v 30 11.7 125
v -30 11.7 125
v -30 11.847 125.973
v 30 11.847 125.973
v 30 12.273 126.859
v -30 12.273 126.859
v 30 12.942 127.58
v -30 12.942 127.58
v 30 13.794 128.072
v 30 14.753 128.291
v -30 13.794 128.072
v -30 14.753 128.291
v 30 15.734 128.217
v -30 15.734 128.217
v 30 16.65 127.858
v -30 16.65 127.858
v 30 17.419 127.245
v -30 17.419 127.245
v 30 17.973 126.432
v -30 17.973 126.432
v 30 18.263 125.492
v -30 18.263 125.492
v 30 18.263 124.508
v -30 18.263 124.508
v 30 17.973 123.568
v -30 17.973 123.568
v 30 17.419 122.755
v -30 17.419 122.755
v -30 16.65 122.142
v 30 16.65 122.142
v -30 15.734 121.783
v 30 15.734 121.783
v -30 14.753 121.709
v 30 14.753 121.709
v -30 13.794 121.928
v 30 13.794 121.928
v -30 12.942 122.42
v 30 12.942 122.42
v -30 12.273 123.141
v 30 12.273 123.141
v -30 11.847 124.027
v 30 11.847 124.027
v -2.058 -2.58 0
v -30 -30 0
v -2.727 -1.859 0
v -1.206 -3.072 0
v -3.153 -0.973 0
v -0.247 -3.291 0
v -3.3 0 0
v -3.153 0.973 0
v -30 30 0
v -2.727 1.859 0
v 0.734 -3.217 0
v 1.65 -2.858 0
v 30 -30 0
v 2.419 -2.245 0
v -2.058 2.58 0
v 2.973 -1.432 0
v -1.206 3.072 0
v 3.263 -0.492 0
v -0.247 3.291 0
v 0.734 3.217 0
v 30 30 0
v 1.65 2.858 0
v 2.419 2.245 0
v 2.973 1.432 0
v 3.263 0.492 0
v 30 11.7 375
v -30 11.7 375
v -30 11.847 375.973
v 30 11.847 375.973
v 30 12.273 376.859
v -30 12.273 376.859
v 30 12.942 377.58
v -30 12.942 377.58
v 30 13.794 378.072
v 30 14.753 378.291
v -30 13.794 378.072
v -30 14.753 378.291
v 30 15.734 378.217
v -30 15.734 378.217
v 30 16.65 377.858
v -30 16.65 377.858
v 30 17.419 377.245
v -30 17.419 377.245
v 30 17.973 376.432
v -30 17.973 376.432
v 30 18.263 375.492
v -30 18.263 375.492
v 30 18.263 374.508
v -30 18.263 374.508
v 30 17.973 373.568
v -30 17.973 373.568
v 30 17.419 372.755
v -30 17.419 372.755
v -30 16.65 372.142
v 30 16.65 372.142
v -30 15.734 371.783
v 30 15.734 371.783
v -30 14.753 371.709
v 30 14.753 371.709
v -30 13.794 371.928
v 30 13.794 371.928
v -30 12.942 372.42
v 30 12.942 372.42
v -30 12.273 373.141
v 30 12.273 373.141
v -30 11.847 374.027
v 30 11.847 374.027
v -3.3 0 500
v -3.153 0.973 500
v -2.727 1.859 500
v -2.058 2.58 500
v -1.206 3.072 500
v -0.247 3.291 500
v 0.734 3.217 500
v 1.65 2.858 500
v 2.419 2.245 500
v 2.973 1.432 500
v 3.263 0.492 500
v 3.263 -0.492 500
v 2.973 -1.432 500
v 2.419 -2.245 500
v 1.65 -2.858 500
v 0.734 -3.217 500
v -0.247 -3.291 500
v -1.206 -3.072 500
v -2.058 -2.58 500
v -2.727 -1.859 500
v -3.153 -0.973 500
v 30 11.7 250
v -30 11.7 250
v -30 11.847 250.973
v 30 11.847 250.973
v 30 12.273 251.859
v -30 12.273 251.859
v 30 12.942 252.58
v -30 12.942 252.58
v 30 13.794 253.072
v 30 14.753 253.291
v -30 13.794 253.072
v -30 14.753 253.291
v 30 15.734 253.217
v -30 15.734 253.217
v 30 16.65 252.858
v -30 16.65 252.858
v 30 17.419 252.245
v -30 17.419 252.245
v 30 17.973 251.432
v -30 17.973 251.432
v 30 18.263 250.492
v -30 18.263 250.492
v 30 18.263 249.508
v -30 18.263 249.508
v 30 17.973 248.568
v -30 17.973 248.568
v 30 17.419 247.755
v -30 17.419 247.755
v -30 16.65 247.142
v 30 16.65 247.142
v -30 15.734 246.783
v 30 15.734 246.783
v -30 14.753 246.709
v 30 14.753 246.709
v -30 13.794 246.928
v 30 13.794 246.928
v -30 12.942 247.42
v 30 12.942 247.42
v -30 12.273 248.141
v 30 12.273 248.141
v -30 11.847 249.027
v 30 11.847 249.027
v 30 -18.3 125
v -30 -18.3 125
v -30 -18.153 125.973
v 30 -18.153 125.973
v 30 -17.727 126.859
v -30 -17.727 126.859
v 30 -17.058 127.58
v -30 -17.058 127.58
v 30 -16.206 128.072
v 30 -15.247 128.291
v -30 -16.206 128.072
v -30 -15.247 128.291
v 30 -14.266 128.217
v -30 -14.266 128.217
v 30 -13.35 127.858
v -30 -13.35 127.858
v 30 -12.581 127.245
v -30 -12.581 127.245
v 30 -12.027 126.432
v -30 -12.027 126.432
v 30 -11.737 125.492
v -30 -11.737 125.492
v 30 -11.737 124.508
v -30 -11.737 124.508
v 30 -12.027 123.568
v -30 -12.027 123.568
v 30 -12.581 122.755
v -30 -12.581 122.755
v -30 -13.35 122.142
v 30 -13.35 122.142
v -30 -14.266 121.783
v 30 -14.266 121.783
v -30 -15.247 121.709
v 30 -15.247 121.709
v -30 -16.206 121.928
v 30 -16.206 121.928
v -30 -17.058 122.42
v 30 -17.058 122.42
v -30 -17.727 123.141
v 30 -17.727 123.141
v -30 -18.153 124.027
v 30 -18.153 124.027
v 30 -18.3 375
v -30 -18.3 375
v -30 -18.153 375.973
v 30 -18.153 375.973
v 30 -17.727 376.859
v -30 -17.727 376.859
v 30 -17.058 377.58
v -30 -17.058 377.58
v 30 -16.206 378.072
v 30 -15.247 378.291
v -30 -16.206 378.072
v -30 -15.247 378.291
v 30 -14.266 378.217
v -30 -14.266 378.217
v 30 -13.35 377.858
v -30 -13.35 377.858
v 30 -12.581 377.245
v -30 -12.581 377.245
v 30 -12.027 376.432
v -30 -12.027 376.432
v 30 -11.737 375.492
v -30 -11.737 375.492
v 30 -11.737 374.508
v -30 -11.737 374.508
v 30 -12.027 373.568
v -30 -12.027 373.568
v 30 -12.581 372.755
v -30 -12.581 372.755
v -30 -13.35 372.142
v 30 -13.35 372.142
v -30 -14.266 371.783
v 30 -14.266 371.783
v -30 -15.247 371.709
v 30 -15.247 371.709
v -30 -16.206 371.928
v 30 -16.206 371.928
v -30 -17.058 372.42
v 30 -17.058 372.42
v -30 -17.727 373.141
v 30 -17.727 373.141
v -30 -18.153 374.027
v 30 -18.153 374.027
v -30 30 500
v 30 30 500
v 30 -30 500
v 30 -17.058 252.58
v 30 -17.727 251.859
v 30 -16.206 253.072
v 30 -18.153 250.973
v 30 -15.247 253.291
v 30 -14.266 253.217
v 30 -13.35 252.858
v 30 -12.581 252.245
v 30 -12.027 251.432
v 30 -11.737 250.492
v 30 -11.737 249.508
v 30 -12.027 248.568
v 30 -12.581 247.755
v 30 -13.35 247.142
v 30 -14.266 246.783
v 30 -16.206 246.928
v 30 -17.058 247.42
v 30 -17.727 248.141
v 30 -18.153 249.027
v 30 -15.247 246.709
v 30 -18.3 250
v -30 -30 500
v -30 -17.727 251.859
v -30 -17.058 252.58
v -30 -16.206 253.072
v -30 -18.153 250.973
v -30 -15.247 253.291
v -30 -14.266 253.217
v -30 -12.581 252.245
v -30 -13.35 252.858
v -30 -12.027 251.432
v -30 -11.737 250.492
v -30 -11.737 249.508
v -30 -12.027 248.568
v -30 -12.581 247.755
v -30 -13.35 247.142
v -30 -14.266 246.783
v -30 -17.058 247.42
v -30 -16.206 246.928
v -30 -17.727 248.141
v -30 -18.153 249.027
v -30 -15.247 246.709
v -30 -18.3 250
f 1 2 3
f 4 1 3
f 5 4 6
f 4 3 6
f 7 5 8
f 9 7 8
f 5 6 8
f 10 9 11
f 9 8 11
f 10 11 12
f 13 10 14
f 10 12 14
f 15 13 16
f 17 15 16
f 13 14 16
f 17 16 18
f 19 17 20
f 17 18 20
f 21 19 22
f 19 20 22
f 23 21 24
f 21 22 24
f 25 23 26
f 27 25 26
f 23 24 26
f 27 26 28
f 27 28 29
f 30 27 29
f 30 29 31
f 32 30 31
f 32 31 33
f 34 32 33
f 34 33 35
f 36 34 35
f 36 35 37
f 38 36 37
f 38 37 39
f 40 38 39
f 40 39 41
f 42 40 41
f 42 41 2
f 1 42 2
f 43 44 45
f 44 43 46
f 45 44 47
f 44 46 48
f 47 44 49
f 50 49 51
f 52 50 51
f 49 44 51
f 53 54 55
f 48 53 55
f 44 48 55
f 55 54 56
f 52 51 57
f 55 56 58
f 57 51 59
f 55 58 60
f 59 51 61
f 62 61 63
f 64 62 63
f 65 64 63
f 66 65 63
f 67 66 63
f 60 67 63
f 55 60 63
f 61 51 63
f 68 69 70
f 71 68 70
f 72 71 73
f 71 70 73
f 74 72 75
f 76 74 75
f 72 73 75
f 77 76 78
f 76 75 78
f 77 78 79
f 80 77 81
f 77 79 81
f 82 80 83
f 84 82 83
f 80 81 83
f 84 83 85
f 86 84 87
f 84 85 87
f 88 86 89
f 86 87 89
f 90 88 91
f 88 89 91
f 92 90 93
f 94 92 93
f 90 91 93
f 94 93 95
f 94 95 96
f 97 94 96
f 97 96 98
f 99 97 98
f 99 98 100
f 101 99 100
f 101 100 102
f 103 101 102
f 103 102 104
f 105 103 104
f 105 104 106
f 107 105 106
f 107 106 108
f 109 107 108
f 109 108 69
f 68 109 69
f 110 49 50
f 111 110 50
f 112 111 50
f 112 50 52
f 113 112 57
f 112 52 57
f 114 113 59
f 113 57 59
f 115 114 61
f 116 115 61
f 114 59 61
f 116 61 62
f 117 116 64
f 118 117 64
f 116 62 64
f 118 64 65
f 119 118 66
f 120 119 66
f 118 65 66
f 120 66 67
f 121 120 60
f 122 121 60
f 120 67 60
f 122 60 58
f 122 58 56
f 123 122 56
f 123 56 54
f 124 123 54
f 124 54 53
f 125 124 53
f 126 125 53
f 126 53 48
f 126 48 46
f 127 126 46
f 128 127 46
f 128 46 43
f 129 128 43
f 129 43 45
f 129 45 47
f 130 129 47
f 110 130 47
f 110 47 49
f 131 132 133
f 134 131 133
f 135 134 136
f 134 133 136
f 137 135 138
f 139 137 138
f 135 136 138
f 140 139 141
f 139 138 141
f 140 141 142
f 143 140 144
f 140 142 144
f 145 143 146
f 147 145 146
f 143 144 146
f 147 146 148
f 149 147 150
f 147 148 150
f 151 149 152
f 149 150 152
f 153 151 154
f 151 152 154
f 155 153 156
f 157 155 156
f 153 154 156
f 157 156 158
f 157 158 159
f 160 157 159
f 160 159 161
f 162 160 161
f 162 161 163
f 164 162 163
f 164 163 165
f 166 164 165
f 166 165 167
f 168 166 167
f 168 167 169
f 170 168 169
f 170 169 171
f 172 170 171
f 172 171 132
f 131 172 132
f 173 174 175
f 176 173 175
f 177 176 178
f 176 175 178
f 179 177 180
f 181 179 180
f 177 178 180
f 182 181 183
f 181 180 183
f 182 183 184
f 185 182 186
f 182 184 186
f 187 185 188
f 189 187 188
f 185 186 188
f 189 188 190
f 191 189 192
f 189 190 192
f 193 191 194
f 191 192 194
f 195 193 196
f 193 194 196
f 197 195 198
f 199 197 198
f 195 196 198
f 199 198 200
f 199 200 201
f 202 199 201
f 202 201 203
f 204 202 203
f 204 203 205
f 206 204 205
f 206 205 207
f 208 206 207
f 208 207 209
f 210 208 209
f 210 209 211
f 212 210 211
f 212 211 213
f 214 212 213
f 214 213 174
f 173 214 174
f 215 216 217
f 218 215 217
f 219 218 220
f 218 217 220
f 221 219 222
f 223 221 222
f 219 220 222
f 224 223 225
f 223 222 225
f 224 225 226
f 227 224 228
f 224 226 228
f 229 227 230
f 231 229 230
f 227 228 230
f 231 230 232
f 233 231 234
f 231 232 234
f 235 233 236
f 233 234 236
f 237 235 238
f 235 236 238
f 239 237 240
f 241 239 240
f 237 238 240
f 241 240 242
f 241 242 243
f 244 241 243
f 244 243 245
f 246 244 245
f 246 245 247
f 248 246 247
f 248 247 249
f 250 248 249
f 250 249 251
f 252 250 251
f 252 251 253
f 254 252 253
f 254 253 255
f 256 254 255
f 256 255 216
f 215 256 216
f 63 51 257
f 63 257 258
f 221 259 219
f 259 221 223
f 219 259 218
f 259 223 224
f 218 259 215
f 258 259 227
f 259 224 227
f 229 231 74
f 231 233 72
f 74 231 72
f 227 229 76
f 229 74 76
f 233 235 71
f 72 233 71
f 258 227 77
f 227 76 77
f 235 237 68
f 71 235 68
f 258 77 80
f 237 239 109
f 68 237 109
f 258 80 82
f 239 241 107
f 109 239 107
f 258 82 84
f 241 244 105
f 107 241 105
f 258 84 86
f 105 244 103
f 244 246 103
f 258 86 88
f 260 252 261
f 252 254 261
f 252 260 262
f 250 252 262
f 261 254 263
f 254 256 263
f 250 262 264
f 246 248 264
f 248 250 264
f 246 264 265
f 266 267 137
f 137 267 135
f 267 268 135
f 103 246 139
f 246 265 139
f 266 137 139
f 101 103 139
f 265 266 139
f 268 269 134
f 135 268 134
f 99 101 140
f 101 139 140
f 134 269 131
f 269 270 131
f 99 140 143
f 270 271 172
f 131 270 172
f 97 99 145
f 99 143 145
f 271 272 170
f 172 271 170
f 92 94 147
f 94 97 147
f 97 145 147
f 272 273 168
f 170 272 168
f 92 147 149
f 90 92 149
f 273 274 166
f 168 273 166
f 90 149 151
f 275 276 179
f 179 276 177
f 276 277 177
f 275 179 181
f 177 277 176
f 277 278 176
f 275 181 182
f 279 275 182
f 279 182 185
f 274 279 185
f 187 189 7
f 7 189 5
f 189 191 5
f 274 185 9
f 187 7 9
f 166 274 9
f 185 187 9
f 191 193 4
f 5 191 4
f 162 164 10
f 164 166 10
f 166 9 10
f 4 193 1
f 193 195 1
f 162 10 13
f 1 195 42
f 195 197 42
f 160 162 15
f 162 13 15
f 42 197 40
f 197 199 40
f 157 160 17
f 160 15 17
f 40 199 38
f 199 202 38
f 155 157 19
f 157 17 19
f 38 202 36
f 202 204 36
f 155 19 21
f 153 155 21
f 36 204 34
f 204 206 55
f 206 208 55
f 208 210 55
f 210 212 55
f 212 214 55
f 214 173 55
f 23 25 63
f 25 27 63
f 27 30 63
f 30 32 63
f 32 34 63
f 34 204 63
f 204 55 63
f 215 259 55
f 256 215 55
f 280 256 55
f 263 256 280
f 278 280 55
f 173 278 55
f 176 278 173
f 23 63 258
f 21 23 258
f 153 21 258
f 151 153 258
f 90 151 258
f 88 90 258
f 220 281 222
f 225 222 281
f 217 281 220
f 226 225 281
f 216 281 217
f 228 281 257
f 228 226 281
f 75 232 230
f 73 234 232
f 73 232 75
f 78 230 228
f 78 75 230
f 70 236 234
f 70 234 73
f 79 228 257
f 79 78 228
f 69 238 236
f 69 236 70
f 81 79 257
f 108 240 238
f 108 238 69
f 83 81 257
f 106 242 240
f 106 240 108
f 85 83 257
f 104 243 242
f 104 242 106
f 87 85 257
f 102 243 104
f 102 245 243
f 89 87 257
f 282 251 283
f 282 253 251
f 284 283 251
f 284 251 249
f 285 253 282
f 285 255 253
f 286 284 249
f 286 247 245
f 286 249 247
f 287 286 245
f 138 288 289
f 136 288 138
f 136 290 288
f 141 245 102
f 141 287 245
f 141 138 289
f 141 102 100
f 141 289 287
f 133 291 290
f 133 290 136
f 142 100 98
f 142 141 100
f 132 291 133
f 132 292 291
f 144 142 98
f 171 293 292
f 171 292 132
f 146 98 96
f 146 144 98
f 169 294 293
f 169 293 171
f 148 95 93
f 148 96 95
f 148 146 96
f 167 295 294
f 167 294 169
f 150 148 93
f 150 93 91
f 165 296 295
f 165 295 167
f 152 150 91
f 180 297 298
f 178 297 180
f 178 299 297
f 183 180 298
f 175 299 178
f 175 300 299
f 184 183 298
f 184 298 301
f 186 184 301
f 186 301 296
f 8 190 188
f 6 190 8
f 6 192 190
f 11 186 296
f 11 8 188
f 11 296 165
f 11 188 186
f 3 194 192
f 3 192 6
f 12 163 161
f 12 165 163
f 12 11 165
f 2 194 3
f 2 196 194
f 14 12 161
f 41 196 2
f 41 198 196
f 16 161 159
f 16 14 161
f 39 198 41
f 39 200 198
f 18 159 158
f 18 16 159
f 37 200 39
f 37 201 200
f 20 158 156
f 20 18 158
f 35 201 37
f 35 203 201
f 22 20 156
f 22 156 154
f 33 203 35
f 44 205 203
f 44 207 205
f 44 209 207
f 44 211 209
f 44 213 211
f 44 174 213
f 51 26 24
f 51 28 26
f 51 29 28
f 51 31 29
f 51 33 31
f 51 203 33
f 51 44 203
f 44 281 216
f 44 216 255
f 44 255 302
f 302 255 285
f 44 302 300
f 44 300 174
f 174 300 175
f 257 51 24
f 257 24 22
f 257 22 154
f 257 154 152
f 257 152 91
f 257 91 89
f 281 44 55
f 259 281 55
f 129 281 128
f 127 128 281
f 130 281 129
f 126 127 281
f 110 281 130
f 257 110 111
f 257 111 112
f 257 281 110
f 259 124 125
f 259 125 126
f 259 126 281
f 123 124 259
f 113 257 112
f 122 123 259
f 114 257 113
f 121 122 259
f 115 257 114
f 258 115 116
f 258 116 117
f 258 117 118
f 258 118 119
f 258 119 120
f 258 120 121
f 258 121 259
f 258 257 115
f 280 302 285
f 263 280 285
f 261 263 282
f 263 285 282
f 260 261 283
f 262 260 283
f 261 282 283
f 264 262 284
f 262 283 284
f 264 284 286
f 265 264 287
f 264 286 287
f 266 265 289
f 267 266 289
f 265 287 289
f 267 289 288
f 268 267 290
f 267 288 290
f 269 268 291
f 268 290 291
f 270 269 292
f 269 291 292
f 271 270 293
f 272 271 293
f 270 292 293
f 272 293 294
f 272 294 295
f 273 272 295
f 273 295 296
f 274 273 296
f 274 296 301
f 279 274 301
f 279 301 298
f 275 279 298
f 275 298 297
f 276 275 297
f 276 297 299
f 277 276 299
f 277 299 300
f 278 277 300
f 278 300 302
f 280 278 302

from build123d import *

# Parameters (mm, degrees)
F0_W     = 60
F0_H     = 60
F1_DEPTH = 500
F3_D     = 6.6
F5_D     = 6.6


with BuildPart() as f1:
    # F0 (on Top) → F1 (new body)
    with BuildSketch(Plane.XY):
        Rectangle(F0_W, F0_H)
    extrude(amount=F1_DEPTH)

    # F3 (through all)
    with Locations(Plane.XY.offset(500)):
        with Locations((0, 0)):
            Hole(F3_D / 2)

    # F5 (through all)
    with Locations(Plane.YZ.offset(30)):
        with Locations((-15, 375), (15, 375), (15, 250), (15, 125), (-15, 125), (-15, 250)):
            Hole(F5_D / 2)


solid = f1.part
